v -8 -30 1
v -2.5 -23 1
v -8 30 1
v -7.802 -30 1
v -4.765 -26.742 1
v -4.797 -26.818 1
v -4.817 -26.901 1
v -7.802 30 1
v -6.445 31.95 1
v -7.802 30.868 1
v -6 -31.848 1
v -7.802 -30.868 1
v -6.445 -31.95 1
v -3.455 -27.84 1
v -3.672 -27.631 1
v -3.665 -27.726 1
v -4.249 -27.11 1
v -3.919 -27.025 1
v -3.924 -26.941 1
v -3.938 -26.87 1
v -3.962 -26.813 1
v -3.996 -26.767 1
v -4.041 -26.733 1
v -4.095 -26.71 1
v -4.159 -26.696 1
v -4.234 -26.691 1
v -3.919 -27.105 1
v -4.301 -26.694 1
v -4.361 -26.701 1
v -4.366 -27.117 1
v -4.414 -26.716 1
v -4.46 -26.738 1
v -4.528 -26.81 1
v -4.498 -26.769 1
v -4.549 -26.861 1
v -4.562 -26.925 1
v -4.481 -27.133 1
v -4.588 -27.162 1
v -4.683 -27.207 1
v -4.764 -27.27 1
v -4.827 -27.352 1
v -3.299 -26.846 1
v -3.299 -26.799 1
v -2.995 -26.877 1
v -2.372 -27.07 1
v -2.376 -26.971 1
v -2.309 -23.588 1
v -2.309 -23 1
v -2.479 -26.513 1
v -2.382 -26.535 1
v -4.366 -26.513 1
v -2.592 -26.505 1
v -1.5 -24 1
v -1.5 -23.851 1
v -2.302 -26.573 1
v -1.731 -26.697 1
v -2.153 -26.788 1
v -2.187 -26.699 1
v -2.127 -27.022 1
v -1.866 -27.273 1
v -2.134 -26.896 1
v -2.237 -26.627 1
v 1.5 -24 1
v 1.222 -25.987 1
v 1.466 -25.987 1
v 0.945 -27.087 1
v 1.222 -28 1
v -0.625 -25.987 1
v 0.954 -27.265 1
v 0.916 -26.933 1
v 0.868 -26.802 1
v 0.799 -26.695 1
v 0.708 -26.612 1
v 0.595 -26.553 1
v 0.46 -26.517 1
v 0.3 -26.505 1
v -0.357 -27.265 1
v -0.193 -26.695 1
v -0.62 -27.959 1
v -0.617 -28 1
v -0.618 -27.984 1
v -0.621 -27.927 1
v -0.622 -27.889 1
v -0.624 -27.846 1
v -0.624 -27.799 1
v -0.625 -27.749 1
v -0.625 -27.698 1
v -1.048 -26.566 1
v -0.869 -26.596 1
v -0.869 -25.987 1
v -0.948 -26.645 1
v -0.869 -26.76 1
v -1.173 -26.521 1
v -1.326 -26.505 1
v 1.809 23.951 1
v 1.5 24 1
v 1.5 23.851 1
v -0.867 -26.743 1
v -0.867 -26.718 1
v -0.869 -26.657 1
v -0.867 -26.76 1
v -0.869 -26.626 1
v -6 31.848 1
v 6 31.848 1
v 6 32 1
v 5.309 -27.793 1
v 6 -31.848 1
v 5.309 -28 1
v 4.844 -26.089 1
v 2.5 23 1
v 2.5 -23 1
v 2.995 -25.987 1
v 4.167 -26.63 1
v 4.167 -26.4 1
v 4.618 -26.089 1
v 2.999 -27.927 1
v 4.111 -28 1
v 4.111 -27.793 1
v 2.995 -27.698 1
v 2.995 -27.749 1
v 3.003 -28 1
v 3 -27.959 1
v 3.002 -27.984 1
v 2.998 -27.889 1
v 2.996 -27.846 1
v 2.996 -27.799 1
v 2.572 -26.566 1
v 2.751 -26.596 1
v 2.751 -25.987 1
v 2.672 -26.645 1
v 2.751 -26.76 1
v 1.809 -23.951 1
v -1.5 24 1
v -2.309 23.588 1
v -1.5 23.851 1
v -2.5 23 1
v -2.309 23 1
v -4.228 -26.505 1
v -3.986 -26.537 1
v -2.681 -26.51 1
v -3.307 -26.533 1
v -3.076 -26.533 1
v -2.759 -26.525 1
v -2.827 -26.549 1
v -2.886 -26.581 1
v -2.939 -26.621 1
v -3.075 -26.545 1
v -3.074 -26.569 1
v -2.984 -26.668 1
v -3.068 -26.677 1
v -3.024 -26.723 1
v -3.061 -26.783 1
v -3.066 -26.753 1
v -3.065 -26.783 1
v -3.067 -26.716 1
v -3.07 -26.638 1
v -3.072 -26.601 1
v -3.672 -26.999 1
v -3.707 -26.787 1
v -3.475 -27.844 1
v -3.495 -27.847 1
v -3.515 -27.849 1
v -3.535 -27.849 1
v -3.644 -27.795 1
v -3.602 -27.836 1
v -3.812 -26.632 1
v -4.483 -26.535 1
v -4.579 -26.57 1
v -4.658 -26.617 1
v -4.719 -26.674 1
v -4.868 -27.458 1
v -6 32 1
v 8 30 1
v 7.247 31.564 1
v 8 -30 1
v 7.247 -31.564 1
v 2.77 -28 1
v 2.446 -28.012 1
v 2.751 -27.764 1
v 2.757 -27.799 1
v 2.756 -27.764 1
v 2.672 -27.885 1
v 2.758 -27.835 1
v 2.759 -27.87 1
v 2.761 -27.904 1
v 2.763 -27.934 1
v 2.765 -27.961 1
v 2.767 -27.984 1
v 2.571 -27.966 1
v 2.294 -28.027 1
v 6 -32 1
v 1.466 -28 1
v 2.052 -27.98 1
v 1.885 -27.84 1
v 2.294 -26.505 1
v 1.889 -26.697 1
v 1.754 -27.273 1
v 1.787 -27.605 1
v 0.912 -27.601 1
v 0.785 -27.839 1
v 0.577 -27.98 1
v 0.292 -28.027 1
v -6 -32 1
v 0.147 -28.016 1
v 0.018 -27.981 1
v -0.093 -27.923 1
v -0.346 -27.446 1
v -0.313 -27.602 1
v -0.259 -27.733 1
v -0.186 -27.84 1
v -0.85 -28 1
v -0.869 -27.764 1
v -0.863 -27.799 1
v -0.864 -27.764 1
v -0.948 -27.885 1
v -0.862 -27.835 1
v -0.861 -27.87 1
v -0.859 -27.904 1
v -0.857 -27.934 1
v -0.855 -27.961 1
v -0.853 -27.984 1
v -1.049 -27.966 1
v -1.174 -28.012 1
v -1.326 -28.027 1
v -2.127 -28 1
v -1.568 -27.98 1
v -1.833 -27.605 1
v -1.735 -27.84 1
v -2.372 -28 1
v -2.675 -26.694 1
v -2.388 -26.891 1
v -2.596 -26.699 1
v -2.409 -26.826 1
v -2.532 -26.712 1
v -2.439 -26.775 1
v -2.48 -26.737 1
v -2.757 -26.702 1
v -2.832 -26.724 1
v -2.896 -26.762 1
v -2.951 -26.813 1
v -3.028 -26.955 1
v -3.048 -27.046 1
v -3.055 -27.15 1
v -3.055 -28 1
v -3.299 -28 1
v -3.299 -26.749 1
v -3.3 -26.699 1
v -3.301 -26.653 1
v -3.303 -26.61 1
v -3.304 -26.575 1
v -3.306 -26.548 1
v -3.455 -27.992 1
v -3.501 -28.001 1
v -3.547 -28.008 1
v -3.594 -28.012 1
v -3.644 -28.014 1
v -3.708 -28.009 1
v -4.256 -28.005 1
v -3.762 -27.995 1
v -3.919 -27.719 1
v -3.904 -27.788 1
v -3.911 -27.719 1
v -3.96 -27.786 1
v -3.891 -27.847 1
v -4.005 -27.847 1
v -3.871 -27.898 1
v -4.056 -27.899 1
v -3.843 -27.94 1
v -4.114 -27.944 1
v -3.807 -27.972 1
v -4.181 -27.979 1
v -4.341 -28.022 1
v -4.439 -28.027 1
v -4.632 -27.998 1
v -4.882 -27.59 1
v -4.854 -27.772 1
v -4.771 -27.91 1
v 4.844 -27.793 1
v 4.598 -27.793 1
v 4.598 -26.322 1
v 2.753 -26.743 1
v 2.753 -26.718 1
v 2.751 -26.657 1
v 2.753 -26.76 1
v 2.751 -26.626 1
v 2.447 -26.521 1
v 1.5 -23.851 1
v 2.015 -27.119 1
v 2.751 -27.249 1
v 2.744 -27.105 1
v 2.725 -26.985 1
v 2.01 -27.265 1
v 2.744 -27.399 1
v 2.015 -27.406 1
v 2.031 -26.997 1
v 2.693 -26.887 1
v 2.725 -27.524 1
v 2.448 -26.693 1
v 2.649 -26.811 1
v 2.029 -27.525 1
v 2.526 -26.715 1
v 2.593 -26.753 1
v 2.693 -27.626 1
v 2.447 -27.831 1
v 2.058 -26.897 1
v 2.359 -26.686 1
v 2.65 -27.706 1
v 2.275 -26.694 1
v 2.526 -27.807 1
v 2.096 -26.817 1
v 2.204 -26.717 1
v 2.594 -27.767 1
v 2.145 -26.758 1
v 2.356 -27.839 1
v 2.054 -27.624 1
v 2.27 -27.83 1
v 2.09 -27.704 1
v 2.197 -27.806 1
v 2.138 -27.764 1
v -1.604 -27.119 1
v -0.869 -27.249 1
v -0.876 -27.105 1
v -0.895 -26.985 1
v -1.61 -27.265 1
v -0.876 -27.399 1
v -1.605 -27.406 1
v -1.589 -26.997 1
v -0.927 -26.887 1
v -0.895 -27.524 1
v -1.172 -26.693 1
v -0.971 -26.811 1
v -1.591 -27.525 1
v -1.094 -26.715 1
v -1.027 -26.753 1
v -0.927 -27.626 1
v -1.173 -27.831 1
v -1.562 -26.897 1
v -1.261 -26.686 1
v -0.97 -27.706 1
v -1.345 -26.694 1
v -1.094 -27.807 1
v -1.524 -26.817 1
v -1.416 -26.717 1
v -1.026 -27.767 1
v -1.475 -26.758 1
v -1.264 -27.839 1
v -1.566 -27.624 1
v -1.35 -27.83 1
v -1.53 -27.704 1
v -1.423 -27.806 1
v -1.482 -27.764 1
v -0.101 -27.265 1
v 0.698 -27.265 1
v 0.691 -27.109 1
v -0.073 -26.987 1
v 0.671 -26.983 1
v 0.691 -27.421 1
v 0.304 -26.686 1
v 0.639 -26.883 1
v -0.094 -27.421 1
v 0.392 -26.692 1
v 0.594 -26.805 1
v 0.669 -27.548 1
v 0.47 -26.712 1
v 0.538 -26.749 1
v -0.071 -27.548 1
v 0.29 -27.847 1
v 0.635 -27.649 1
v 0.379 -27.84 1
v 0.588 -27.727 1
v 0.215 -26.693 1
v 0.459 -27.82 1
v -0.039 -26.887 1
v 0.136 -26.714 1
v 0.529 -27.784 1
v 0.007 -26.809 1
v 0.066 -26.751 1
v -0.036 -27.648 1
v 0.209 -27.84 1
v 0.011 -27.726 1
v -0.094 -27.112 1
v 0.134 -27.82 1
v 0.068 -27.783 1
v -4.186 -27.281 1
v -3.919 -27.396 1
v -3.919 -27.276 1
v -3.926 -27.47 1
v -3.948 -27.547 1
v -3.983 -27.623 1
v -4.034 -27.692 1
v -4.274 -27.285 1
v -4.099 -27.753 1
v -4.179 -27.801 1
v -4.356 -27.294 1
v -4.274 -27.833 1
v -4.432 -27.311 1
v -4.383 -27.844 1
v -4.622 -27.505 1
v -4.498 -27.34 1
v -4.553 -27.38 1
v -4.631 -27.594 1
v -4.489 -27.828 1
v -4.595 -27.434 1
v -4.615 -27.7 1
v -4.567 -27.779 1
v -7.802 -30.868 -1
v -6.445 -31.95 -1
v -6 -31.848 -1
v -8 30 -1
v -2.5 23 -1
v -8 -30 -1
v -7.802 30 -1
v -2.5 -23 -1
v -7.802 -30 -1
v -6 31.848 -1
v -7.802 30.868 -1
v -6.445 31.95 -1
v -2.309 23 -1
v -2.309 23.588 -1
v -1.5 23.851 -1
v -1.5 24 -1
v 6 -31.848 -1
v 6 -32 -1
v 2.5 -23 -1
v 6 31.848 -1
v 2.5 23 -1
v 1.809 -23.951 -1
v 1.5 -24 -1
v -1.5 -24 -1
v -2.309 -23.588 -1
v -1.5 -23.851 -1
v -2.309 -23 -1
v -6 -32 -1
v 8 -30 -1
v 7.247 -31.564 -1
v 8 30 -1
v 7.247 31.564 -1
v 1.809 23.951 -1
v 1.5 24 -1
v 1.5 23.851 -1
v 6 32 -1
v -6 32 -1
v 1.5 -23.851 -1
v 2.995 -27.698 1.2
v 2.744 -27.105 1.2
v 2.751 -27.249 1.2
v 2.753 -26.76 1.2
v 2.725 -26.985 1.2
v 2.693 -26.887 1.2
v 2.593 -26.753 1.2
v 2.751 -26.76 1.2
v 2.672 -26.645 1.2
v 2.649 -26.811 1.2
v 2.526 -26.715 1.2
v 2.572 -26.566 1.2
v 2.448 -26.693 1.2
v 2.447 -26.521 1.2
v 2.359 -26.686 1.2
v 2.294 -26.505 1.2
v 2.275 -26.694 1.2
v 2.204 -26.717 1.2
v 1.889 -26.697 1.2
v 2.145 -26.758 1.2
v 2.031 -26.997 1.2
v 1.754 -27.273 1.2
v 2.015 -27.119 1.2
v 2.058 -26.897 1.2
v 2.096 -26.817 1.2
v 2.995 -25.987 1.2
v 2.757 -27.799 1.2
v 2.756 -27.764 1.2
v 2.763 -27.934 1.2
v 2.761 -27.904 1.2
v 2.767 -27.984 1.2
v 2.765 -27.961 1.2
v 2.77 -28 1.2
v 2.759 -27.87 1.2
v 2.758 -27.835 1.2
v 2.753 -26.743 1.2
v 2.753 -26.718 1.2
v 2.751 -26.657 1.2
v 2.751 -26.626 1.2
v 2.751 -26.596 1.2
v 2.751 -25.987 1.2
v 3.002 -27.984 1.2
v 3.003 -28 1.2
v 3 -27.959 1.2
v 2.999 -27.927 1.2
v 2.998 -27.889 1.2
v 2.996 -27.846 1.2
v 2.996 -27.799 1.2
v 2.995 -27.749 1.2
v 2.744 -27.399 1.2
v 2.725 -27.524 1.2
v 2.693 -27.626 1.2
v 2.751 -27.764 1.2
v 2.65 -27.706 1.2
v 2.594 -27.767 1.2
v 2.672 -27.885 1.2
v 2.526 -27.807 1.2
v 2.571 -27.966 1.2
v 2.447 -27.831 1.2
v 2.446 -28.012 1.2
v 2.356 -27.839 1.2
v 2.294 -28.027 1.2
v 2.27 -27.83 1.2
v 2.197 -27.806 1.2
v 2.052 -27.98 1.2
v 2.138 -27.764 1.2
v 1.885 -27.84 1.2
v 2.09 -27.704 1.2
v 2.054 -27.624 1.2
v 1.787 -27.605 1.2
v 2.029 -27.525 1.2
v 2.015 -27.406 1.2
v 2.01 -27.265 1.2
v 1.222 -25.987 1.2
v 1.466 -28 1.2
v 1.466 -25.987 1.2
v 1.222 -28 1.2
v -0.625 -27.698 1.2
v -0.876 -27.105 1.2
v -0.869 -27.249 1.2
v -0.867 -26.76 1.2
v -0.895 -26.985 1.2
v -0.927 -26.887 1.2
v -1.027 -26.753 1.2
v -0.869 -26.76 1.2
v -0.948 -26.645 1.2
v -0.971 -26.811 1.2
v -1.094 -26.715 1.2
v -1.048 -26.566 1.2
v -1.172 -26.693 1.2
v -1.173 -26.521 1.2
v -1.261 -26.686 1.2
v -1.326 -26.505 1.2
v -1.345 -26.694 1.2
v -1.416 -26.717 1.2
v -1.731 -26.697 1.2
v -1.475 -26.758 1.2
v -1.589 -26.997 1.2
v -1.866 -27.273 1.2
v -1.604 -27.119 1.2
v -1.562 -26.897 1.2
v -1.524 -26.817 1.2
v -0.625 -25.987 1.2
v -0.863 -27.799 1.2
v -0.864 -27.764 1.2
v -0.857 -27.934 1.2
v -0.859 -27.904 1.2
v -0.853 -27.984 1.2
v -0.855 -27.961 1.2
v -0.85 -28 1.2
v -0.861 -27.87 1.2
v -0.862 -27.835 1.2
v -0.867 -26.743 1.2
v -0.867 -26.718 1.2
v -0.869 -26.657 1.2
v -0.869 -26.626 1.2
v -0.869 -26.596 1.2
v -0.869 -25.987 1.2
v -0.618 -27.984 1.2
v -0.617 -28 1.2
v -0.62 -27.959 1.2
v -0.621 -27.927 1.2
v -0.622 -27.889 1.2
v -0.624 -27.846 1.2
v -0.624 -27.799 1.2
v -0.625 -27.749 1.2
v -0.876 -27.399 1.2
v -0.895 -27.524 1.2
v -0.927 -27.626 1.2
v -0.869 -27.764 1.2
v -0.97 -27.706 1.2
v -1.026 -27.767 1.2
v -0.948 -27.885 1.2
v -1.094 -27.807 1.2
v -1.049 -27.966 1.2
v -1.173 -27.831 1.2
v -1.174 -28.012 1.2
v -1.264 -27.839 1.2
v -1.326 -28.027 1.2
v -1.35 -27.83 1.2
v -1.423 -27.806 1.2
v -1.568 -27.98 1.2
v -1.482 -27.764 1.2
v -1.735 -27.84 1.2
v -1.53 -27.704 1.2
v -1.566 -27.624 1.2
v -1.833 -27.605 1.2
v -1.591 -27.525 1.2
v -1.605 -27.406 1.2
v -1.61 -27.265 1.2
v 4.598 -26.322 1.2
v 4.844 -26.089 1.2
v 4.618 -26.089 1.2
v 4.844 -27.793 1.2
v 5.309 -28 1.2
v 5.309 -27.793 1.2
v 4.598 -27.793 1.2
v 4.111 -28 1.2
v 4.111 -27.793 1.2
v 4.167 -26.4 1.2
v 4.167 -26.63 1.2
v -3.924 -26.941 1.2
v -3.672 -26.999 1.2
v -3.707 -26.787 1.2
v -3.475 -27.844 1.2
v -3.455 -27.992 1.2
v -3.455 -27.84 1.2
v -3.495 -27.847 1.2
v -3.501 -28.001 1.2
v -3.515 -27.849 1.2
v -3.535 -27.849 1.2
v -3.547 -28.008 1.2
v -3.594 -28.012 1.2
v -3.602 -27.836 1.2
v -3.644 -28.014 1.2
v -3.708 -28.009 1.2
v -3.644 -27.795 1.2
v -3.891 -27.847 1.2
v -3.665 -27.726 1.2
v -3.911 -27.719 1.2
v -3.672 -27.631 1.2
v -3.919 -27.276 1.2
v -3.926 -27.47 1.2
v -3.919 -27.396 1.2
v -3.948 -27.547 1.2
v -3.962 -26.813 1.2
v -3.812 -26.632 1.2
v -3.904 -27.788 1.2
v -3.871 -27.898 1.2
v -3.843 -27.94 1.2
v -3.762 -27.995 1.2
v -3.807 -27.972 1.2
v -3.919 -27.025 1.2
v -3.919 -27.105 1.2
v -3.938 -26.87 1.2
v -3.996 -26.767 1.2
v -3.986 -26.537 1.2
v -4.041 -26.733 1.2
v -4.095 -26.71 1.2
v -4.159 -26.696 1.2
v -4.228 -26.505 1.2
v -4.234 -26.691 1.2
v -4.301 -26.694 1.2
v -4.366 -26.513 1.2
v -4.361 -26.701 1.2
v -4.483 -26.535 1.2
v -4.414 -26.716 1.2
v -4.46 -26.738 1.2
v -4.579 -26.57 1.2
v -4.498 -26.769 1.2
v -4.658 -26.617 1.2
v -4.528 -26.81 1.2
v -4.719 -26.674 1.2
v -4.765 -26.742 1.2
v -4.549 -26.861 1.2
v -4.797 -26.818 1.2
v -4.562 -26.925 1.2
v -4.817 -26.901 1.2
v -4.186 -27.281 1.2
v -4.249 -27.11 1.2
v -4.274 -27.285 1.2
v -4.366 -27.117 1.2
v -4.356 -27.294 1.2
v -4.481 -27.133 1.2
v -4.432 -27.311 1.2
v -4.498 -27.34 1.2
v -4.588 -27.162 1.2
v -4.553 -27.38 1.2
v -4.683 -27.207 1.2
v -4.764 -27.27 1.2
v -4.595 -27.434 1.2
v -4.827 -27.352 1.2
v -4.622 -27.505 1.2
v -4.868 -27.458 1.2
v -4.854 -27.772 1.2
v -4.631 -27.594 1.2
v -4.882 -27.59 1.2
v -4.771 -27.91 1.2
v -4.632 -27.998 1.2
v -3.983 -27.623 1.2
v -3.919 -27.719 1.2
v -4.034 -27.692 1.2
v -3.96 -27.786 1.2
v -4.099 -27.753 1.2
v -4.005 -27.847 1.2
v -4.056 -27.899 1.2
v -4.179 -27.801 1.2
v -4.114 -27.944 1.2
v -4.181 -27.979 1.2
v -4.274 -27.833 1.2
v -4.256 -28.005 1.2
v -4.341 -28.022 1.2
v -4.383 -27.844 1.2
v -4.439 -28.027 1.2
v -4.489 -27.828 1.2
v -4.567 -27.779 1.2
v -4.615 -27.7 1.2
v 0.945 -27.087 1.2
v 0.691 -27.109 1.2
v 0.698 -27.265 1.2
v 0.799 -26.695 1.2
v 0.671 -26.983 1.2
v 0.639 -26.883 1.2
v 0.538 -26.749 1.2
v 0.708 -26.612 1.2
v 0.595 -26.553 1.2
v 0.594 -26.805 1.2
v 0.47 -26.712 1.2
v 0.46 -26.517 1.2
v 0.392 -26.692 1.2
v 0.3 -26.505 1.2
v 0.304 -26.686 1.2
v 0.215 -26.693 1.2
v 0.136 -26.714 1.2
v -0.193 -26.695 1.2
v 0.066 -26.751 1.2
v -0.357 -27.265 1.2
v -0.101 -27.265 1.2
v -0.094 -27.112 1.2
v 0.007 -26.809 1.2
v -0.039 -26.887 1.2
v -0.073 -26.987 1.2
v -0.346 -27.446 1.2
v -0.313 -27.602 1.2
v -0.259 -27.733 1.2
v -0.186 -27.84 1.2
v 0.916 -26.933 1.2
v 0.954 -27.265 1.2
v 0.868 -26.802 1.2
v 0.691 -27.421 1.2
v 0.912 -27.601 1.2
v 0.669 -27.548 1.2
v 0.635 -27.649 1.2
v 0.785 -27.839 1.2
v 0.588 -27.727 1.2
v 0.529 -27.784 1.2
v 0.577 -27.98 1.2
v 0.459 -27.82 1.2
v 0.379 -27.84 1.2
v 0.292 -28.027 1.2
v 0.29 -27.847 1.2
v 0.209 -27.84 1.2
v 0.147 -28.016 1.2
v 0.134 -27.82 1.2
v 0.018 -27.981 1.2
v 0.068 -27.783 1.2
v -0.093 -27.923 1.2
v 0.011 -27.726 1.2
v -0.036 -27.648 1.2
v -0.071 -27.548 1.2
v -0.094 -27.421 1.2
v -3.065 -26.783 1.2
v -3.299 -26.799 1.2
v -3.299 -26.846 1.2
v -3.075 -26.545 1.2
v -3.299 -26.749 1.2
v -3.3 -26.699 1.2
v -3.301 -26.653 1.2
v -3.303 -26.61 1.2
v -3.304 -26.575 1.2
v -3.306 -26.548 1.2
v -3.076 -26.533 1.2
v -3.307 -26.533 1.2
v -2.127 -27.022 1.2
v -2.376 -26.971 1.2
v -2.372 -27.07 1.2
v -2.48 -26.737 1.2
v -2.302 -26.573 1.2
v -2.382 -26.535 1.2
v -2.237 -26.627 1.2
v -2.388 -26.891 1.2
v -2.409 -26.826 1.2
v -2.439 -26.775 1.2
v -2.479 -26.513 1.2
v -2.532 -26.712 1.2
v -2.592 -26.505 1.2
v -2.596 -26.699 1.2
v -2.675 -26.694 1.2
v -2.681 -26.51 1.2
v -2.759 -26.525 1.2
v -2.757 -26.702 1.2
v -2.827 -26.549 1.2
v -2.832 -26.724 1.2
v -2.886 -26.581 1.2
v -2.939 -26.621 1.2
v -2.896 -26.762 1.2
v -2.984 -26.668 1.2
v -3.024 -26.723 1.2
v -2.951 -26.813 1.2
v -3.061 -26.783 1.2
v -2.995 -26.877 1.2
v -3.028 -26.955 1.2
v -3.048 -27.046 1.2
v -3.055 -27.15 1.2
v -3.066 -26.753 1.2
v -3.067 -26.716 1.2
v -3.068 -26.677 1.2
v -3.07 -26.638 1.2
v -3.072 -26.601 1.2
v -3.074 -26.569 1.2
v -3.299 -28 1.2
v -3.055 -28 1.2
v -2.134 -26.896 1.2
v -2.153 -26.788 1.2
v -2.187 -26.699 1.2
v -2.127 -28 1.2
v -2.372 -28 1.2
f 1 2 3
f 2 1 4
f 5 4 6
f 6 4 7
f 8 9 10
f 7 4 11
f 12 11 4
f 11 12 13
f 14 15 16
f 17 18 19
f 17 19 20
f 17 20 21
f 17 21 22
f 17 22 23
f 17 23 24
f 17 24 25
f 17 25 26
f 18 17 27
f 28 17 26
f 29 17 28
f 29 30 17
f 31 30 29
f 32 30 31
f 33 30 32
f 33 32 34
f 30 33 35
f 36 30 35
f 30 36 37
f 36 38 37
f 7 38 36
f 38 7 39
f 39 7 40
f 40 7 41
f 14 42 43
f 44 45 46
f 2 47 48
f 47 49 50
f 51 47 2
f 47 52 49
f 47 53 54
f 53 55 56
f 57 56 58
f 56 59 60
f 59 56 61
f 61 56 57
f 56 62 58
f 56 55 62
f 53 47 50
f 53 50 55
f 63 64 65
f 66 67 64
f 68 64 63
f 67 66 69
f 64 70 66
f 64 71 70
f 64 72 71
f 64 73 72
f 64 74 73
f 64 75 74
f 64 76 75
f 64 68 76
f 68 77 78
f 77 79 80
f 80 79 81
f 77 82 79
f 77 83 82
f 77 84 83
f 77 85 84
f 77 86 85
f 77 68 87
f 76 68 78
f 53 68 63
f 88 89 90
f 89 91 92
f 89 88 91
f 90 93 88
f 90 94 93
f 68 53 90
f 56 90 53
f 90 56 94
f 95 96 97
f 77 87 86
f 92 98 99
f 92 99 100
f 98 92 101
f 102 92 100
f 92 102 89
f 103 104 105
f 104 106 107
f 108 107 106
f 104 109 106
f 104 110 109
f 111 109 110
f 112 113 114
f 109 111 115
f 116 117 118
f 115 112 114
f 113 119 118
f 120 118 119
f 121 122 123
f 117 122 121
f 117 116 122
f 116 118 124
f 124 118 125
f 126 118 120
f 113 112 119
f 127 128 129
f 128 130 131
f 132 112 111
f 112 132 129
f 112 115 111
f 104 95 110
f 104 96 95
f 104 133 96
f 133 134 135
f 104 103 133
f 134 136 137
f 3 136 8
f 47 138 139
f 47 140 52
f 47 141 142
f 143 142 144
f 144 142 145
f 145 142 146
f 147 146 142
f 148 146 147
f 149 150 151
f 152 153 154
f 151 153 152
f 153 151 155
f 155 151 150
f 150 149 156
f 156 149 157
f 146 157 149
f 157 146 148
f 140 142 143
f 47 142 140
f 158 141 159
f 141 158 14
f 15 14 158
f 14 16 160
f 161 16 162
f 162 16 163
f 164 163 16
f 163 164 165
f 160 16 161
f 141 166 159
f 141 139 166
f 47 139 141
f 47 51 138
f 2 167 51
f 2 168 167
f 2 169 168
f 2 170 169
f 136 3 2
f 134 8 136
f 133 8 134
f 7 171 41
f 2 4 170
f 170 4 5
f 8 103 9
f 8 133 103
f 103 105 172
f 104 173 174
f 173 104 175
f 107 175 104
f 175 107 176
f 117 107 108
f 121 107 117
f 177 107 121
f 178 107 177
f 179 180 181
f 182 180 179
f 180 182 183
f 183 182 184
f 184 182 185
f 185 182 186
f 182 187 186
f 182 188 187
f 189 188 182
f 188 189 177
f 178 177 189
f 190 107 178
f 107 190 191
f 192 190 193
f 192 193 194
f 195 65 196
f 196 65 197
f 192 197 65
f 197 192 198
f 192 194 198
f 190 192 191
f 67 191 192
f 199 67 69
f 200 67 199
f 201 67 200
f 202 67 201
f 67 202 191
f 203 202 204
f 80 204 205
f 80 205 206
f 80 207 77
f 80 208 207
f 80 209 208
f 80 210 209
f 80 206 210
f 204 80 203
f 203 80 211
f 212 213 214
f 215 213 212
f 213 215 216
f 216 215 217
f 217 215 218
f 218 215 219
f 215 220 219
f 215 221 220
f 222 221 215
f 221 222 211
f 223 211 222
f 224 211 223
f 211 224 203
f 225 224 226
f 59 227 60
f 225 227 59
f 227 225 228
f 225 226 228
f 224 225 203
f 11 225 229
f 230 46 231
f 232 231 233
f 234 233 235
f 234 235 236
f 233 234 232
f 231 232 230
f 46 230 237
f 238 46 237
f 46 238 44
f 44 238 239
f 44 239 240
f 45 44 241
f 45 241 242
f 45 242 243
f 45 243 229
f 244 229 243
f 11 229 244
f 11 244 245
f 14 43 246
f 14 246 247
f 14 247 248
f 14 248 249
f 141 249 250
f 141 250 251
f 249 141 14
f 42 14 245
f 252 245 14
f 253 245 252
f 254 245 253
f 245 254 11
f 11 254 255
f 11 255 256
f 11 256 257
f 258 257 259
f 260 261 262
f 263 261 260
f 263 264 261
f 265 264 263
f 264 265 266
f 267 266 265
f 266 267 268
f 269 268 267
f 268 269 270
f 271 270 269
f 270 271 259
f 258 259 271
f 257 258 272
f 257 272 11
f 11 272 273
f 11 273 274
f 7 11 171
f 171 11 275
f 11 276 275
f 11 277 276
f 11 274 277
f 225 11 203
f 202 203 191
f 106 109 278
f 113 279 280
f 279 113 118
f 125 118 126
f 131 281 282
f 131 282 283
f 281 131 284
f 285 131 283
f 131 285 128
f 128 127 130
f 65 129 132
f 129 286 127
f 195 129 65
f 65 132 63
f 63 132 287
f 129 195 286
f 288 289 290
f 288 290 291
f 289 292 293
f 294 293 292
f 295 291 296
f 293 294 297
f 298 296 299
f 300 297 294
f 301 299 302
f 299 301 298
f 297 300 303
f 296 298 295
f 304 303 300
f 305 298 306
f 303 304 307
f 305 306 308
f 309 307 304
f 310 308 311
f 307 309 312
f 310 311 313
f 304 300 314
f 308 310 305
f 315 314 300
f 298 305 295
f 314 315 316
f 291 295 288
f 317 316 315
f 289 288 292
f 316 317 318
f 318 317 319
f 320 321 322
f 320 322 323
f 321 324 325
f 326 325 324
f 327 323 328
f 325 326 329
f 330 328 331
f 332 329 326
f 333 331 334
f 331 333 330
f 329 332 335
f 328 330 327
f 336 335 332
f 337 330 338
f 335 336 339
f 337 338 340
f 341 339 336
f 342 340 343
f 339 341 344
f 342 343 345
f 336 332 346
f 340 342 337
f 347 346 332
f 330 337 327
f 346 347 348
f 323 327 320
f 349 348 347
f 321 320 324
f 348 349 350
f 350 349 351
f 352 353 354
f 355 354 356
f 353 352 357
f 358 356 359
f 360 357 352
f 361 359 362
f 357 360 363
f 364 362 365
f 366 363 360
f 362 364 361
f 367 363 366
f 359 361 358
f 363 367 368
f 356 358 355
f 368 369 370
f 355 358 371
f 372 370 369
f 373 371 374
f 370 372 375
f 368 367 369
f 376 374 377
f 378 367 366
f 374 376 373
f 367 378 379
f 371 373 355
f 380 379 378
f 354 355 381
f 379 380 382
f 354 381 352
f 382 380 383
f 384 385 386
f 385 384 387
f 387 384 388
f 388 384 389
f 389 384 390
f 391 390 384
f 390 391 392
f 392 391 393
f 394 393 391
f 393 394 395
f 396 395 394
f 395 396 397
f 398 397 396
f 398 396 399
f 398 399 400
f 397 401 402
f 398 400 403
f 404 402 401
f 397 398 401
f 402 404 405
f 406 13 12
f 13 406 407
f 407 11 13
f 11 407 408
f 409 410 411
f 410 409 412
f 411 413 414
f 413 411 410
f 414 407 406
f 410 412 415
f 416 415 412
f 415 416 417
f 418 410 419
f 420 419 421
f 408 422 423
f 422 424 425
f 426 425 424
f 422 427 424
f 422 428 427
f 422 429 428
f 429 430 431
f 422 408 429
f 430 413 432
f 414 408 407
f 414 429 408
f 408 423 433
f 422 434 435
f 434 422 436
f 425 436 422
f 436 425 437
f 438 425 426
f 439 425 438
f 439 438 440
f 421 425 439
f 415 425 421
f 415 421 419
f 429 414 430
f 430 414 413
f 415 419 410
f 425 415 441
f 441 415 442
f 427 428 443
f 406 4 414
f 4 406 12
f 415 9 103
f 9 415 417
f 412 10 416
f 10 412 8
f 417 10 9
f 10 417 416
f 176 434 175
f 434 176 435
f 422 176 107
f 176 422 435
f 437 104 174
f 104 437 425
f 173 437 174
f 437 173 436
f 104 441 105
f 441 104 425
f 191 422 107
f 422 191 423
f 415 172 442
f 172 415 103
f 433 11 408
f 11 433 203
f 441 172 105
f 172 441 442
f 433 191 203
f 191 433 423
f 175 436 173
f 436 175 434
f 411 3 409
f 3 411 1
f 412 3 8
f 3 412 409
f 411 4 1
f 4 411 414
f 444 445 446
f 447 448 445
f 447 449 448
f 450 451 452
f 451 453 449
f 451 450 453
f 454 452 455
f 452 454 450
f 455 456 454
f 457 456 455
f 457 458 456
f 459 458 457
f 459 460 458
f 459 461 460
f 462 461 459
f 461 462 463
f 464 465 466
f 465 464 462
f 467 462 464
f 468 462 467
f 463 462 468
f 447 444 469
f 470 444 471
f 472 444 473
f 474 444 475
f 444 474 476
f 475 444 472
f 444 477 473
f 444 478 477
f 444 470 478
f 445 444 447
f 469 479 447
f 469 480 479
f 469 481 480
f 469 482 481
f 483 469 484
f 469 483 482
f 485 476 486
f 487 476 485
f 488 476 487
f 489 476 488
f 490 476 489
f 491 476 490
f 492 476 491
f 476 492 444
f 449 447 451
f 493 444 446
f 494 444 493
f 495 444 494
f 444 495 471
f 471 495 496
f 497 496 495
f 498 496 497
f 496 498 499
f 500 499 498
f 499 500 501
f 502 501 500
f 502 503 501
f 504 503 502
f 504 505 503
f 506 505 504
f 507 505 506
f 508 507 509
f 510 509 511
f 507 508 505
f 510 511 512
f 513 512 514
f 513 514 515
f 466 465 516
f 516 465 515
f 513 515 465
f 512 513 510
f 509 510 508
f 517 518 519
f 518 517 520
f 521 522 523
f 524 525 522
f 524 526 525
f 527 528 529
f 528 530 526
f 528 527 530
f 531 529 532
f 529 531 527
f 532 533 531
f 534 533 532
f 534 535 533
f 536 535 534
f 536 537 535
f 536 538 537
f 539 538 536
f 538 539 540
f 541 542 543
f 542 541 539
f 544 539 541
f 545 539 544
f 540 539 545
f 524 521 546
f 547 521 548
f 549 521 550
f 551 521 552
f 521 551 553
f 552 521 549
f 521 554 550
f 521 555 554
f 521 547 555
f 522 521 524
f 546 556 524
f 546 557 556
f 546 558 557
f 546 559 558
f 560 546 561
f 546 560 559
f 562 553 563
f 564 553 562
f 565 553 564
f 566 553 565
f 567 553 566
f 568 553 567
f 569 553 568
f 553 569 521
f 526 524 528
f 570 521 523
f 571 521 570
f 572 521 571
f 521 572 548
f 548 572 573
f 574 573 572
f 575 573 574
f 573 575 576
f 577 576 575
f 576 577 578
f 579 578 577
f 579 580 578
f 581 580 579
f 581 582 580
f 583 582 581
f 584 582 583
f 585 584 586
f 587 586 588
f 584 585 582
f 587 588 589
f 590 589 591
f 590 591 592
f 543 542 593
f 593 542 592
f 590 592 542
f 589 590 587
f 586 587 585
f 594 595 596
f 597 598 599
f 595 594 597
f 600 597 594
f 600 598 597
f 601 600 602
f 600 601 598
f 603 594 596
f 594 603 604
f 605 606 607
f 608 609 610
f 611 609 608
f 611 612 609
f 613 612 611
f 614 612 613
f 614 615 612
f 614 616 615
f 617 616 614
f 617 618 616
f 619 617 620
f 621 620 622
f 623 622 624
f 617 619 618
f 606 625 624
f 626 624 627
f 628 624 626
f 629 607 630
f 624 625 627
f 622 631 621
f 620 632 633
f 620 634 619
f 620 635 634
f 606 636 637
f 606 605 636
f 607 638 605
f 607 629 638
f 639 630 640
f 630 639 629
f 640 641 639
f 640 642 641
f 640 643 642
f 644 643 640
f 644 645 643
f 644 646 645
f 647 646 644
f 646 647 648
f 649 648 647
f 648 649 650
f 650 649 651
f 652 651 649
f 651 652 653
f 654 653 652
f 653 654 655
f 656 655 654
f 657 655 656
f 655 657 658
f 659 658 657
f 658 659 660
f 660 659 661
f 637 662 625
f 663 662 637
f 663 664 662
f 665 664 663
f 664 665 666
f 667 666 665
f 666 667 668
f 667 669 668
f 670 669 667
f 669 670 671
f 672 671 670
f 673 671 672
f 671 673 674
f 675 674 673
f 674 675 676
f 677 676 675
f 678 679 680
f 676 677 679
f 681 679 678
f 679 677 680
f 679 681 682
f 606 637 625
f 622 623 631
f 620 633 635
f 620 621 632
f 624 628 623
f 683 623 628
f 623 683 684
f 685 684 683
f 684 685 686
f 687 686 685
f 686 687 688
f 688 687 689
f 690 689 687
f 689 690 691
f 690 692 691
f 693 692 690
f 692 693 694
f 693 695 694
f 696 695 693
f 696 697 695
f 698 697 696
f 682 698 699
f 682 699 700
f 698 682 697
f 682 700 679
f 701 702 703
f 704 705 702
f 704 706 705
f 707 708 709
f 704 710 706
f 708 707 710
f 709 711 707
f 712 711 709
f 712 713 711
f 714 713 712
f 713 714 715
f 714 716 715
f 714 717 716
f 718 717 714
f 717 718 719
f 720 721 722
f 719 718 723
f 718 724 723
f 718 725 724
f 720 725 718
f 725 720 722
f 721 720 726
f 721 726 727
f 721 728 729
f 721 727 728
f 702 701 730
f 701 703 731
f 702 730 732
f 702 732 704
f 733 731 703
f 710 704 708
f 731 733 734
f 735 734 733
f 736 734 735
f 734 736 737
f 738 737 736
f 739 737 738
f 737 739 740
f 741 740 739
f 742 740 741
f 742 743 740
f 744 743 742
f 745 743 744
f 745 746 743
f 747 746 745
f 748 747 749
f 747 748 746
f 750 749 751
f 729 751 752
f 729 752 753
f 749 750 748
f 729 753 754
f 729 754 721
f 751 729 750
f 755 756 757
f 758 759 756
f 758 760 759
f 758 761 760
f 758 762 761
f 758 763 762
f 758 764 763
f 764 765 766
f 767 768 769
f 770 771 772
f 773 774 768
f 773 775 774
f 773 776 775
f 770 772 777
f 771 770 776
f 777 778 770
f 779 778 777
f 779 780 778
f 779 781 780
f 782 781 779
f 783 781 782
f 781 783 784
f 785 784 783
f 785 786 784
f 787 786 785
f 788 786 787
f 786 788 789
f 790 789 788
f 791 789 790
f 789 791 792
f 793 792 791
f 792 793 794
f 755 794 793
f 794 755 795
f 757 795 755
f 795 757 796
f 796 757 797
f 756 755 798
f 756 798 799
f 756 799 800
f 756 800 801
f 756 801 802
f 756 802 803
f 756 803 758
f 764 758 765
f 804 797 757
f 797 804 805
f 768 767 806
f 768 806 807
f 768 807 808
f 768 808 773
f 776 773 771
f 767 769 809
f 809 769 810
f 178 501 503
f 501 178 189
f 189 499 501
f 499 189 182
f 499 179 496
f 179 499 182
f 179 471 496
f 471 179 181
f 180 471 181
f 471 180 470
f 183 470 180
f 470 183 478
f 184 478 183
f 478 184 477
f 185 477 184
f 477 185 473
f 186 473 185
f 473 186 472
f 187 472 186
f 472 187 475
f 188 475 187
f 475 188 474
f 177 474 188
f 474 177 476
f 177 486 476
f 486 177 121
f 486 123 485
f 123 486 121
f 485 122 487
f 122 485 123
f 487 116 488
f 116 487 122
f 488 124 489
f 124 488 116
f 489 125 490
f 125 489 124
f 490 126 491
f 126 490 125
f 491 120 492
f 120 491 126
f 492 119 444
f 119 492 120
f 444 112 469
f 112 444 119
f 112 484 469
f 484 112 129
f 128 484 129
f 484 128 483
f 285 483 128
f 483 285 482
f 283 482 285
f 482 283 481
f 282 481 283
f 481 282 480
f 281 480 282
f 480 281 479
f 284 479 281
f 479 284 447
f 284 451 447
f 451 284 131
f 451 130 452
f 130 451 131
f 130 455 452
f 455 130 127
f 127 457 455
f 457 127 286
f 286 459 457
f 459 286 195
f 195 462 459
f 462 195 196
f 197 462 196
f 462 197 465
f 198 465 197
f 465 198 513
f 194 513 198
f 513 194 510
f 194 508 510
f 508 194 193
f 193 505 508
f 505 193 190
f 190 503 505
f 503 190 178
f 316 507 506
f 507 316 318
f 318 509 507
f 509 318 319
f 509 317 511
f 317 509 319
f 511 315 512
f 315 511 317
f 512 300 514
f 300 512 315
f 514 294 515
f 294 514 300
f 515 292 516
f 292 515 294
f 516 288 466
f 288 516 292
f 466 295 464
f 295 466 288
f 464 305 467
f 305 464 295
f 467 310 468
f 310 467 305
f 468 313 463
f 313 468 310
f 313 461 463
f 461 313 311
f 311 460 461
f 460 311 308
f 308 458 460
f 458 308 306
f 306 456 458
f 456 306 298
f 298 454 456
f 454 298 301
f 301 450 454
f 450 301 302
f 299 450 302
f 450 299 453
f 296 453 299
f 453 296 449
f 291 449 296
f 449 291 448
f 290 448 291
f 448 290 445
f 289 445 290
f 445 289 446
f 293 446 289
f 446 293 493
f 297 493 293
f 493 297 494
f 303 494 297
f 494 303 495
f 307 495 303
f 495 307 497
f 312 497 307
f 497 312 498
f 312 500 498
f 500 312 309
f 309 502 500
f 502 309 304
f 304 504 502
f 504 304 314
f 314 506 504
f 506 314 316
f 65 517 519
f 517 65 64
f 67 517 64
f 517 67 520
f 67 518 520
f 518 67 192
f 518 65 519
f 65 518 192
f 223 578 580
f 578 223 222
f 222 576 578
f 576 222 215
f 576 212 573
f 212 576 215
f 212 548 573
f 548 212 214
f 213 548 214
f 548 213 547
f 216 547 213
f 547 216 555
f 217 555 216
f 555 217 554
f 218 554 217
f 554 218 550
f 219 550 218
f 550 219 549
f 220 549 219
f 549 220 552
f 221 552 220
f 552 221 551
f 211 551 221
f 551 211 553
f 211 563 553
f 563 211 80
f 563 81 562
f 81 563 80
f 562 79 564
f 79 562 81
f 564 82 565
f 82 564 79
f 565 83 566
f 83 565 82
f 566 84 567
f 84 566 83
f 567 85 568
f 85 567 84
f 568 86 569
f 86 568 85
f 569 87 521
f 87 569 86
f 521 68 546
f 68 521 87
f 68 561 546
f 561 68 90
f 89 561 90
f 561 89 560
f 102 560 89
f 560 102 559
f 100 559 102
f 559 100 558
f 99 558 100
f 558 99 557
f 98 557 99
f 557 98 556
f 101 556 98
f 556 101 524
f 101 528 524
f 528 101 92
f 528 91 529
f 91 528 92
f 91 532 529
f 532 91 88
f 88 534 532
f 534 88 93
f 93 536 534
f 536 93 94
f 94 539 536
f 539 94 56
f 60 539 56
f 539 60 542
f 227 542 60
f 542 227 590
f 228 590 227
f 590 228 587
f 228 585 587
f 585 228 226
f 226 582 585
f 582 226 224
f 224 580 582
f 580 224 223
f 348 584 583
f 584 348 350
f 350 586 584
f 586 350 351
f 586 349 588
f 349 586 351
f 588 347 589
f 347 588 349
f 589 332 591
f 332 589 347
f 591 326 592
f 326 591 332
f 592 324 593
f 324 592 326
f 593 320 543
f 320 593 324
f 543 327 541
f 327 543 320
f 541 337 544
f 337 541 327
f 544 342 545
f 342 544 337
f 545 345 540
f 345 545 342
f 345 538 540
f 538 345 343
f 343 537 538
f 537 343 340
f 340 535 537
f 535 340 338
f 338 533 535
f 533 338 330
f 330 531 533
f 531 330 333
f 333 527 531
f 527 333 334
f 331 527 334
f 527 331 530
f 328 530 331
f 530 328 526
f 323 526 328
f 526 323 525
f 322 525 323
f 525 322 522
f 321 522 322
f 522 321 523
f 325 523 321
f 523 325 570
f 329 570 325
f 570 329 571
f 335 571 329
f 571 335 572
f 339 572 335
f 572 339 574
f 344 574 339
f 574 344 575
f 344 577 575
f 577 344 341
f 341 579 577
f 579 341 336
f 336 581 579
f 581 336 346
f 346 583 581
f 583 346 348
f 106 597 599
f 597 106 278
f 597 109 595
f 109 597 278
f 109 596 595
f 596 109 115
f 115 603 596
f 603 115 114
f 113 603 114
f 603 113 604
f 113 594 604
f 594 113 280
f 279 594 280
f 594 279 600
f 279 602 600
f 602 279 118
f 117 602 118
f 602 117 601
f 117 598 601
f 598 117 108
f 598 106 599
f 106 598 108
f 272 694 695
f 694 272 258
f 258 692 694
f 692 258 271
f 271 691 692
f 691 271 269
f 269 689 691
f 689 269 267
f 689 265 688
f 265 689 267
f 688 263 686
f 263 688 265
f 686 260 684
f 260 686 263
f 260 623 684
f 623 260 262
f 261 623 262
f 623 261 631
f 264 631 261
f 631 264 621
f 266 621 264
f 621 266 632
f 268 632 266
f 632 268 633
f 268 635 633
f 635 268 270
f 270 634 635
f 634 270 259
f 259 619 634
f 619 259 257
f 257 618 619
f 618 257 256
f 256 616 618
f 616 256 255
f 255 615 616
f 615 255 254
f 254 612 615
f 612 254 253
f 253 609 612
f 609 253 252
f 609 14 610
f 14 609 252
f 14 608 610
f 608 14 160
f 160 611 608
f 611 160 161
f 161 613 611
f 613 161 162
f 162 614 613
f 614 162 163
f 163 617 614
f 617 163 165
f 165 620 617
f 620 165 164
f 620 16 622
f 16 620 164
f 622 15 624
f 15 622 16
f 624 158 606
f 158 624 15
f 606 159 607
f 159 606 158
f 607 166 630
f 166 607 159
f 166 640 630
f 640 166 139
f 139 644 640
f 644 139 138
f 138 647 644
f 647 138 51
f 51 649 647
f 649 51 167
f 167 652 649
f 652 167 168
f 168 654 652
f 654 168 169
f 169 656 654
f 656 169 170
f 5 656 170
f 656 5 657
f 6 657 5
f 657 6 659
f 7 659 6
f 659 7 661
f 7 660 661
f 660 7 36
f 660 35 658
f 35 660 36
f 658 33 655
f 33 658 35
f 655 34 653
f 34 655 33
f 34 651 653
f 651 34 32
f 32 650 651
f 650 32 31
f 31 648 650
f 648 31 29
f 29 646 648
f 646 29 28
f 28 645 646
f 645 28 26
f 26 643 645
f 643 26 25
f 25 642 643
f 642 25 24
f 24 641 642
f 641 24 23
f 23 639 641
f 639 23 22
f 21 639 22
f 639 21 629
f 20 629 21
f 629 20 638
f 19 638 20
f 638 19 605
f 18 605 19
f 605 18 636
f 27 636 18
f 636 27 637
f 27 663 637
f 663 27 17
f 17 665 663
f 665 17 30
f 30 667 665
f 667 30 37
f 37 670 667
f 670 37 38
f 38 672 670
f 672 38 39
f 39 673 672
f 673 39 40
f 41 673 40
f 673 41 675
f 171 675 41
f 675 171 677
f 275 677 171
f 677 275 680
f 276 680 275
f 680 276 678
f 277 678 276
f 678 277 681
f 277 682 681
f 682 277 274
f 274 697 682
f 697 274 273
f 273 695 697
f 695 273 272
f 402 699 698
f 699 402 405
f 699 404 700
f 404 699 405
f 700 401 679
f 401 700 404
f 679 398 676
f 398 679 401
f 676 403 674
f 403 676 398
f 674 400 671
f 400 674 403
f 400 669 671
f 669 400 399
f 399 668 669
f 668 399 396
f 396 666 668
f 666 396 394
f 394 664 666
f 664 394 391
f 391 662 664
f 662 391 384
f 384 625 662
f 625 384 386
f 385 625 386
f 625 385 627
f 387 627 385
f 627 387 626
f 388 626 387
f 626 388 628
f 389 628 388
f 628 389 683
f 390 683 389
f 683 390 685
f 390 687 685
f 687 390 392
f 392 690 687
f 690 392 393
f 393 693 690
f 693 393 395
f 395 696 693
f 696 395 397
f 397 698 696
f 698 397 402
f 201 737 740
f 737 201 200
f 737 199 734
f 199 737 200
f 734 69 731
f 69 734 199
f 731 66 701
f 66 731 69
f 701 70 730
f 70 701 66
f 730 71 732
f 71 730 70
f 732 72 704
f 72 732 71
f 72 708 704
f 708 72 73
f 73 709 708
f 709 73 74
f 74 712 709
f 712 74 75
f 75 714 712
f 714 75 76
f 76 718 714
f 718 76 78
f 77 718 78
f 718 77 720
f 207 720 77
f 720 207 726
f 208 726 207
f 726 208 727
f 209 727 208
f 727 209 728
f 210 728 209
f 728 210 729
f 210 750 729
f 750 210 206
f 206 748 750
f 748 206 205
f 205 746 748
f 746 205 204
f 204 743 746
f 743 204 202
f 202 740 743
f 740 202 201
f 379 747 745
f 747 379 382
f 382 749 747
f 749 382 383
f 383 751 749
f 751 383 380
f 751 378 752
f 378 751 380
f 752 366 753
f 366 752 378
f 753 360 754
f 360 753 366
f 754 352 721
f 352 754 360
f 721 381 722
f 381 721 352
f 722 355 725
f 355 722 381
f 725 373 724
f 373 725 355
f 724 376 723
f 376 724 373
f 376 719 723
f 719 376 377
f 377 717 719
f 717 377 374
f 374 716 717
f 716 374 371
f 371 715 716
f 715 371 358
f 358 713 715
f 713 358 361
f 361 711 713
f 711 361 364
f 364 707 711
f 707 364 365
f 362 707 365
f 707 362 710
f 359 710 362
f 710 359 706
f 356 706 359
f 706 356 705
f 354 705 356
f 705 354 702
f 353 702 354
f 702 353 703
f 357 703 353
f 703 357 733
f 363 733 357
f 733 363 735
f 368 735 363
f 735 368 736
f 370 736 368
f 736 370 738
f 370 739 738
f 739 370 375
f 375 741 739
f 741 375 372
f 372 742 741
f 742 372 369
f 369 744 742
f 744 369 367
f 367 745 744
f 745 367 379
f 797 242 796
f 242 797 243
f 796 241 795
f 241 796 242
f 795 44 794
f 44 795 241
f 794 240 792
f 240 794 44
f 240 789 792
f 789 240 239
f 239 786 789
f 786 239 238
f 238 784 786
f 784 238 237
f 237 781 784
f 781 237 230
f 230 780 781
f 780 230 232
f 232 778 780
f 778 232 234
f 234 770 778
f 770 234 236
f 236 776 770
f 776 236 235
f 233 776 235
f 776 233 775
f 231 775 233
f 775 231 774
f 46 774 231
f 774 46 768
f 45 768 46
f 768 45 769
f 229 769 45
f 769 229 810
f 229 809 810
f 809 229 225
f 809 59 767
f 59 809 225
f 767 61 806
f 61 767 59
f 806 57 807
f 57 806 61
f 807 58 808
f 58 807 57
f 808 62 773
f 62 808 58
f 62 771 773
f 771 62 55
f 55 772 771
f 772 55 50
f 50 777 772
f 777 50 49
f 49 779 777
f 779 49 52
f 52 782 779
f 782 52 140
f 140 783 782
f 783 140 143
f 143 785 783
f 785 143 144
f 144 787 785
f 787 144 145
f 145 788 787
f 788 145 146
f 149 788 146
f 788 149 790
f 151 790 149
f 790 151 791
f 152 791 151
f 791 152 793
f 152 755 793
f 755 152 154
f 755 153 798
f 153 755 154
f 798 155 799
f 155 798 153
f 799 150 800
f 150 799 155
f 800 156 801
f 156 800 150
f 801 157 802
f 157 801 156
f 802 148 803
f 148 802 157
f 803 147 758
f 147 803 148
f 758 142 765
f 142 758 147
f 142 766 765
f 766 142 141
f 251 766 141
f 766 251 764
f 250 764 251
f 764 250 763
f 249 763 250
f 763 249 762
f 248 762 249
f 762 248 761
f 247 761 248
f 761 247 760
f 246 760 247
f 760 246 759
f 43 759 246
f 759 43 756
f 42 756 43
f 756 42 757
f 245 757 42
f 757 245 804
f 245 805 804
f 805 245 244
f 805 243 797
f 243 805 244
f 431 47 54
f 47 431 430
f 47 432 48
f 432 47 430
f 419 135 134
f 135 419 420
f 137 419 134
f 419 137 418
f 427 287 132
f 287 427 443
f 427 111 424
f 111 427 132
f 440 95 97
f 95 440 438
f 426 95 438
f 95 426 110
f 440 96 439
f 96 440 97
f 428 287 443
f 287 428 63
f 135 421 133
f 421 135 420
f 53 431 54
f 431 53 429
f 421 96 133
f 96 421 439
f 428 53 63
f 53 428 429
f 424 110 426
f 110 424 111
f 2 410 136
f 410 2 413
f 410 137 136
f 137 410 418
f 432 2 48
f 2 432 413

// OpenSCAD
use <MCAD/boxes.scad>

// 상수
THICK = 2;		//	껍질두께
ROUND = 2;	//	상판굴곡
BASE = [16, 64, THICK];	//	상판

// 주요 수치
BLADE_HOLE_WIDTH = 5;		// 날두께(4) + 여유(1)
BLADE_HOLE_HEIGHT = 48;	// 날너비(46) + 여유(2)

// 텍스트 홈파기
// 상판(base)의 왼쪽 아래 기준준
module mark(name, height, base, mx) {
	translate([(base[0]  - mx / 2 - 18) / 2, -(base[1] - mx / 2) / 2, base[2] / 2])
		linear_extrude(height, center = false)
			text(name, size = 2);
}

// 긴홈
module knife1() {
	difference() {
		union() {
			//	상판
			color(c=[0.3, 0.1, 0.0, 0.5])	roundedBox(size=BASE, radius = ROUND, sidesonly = true);

			//	꼬리표
			color(c=[0.9, 0.9, 0.9, 0.5])	mark("andold 1", 0.2, BASE, 16);
		}
		
		//	홈파기
		roundedBox(size = [BLADE_HOLE_WIDTH, BLADE_HOLE_HEIGHT, THICK + 2], radius = 1, sidesonly = true);
	}
}

knife1();
